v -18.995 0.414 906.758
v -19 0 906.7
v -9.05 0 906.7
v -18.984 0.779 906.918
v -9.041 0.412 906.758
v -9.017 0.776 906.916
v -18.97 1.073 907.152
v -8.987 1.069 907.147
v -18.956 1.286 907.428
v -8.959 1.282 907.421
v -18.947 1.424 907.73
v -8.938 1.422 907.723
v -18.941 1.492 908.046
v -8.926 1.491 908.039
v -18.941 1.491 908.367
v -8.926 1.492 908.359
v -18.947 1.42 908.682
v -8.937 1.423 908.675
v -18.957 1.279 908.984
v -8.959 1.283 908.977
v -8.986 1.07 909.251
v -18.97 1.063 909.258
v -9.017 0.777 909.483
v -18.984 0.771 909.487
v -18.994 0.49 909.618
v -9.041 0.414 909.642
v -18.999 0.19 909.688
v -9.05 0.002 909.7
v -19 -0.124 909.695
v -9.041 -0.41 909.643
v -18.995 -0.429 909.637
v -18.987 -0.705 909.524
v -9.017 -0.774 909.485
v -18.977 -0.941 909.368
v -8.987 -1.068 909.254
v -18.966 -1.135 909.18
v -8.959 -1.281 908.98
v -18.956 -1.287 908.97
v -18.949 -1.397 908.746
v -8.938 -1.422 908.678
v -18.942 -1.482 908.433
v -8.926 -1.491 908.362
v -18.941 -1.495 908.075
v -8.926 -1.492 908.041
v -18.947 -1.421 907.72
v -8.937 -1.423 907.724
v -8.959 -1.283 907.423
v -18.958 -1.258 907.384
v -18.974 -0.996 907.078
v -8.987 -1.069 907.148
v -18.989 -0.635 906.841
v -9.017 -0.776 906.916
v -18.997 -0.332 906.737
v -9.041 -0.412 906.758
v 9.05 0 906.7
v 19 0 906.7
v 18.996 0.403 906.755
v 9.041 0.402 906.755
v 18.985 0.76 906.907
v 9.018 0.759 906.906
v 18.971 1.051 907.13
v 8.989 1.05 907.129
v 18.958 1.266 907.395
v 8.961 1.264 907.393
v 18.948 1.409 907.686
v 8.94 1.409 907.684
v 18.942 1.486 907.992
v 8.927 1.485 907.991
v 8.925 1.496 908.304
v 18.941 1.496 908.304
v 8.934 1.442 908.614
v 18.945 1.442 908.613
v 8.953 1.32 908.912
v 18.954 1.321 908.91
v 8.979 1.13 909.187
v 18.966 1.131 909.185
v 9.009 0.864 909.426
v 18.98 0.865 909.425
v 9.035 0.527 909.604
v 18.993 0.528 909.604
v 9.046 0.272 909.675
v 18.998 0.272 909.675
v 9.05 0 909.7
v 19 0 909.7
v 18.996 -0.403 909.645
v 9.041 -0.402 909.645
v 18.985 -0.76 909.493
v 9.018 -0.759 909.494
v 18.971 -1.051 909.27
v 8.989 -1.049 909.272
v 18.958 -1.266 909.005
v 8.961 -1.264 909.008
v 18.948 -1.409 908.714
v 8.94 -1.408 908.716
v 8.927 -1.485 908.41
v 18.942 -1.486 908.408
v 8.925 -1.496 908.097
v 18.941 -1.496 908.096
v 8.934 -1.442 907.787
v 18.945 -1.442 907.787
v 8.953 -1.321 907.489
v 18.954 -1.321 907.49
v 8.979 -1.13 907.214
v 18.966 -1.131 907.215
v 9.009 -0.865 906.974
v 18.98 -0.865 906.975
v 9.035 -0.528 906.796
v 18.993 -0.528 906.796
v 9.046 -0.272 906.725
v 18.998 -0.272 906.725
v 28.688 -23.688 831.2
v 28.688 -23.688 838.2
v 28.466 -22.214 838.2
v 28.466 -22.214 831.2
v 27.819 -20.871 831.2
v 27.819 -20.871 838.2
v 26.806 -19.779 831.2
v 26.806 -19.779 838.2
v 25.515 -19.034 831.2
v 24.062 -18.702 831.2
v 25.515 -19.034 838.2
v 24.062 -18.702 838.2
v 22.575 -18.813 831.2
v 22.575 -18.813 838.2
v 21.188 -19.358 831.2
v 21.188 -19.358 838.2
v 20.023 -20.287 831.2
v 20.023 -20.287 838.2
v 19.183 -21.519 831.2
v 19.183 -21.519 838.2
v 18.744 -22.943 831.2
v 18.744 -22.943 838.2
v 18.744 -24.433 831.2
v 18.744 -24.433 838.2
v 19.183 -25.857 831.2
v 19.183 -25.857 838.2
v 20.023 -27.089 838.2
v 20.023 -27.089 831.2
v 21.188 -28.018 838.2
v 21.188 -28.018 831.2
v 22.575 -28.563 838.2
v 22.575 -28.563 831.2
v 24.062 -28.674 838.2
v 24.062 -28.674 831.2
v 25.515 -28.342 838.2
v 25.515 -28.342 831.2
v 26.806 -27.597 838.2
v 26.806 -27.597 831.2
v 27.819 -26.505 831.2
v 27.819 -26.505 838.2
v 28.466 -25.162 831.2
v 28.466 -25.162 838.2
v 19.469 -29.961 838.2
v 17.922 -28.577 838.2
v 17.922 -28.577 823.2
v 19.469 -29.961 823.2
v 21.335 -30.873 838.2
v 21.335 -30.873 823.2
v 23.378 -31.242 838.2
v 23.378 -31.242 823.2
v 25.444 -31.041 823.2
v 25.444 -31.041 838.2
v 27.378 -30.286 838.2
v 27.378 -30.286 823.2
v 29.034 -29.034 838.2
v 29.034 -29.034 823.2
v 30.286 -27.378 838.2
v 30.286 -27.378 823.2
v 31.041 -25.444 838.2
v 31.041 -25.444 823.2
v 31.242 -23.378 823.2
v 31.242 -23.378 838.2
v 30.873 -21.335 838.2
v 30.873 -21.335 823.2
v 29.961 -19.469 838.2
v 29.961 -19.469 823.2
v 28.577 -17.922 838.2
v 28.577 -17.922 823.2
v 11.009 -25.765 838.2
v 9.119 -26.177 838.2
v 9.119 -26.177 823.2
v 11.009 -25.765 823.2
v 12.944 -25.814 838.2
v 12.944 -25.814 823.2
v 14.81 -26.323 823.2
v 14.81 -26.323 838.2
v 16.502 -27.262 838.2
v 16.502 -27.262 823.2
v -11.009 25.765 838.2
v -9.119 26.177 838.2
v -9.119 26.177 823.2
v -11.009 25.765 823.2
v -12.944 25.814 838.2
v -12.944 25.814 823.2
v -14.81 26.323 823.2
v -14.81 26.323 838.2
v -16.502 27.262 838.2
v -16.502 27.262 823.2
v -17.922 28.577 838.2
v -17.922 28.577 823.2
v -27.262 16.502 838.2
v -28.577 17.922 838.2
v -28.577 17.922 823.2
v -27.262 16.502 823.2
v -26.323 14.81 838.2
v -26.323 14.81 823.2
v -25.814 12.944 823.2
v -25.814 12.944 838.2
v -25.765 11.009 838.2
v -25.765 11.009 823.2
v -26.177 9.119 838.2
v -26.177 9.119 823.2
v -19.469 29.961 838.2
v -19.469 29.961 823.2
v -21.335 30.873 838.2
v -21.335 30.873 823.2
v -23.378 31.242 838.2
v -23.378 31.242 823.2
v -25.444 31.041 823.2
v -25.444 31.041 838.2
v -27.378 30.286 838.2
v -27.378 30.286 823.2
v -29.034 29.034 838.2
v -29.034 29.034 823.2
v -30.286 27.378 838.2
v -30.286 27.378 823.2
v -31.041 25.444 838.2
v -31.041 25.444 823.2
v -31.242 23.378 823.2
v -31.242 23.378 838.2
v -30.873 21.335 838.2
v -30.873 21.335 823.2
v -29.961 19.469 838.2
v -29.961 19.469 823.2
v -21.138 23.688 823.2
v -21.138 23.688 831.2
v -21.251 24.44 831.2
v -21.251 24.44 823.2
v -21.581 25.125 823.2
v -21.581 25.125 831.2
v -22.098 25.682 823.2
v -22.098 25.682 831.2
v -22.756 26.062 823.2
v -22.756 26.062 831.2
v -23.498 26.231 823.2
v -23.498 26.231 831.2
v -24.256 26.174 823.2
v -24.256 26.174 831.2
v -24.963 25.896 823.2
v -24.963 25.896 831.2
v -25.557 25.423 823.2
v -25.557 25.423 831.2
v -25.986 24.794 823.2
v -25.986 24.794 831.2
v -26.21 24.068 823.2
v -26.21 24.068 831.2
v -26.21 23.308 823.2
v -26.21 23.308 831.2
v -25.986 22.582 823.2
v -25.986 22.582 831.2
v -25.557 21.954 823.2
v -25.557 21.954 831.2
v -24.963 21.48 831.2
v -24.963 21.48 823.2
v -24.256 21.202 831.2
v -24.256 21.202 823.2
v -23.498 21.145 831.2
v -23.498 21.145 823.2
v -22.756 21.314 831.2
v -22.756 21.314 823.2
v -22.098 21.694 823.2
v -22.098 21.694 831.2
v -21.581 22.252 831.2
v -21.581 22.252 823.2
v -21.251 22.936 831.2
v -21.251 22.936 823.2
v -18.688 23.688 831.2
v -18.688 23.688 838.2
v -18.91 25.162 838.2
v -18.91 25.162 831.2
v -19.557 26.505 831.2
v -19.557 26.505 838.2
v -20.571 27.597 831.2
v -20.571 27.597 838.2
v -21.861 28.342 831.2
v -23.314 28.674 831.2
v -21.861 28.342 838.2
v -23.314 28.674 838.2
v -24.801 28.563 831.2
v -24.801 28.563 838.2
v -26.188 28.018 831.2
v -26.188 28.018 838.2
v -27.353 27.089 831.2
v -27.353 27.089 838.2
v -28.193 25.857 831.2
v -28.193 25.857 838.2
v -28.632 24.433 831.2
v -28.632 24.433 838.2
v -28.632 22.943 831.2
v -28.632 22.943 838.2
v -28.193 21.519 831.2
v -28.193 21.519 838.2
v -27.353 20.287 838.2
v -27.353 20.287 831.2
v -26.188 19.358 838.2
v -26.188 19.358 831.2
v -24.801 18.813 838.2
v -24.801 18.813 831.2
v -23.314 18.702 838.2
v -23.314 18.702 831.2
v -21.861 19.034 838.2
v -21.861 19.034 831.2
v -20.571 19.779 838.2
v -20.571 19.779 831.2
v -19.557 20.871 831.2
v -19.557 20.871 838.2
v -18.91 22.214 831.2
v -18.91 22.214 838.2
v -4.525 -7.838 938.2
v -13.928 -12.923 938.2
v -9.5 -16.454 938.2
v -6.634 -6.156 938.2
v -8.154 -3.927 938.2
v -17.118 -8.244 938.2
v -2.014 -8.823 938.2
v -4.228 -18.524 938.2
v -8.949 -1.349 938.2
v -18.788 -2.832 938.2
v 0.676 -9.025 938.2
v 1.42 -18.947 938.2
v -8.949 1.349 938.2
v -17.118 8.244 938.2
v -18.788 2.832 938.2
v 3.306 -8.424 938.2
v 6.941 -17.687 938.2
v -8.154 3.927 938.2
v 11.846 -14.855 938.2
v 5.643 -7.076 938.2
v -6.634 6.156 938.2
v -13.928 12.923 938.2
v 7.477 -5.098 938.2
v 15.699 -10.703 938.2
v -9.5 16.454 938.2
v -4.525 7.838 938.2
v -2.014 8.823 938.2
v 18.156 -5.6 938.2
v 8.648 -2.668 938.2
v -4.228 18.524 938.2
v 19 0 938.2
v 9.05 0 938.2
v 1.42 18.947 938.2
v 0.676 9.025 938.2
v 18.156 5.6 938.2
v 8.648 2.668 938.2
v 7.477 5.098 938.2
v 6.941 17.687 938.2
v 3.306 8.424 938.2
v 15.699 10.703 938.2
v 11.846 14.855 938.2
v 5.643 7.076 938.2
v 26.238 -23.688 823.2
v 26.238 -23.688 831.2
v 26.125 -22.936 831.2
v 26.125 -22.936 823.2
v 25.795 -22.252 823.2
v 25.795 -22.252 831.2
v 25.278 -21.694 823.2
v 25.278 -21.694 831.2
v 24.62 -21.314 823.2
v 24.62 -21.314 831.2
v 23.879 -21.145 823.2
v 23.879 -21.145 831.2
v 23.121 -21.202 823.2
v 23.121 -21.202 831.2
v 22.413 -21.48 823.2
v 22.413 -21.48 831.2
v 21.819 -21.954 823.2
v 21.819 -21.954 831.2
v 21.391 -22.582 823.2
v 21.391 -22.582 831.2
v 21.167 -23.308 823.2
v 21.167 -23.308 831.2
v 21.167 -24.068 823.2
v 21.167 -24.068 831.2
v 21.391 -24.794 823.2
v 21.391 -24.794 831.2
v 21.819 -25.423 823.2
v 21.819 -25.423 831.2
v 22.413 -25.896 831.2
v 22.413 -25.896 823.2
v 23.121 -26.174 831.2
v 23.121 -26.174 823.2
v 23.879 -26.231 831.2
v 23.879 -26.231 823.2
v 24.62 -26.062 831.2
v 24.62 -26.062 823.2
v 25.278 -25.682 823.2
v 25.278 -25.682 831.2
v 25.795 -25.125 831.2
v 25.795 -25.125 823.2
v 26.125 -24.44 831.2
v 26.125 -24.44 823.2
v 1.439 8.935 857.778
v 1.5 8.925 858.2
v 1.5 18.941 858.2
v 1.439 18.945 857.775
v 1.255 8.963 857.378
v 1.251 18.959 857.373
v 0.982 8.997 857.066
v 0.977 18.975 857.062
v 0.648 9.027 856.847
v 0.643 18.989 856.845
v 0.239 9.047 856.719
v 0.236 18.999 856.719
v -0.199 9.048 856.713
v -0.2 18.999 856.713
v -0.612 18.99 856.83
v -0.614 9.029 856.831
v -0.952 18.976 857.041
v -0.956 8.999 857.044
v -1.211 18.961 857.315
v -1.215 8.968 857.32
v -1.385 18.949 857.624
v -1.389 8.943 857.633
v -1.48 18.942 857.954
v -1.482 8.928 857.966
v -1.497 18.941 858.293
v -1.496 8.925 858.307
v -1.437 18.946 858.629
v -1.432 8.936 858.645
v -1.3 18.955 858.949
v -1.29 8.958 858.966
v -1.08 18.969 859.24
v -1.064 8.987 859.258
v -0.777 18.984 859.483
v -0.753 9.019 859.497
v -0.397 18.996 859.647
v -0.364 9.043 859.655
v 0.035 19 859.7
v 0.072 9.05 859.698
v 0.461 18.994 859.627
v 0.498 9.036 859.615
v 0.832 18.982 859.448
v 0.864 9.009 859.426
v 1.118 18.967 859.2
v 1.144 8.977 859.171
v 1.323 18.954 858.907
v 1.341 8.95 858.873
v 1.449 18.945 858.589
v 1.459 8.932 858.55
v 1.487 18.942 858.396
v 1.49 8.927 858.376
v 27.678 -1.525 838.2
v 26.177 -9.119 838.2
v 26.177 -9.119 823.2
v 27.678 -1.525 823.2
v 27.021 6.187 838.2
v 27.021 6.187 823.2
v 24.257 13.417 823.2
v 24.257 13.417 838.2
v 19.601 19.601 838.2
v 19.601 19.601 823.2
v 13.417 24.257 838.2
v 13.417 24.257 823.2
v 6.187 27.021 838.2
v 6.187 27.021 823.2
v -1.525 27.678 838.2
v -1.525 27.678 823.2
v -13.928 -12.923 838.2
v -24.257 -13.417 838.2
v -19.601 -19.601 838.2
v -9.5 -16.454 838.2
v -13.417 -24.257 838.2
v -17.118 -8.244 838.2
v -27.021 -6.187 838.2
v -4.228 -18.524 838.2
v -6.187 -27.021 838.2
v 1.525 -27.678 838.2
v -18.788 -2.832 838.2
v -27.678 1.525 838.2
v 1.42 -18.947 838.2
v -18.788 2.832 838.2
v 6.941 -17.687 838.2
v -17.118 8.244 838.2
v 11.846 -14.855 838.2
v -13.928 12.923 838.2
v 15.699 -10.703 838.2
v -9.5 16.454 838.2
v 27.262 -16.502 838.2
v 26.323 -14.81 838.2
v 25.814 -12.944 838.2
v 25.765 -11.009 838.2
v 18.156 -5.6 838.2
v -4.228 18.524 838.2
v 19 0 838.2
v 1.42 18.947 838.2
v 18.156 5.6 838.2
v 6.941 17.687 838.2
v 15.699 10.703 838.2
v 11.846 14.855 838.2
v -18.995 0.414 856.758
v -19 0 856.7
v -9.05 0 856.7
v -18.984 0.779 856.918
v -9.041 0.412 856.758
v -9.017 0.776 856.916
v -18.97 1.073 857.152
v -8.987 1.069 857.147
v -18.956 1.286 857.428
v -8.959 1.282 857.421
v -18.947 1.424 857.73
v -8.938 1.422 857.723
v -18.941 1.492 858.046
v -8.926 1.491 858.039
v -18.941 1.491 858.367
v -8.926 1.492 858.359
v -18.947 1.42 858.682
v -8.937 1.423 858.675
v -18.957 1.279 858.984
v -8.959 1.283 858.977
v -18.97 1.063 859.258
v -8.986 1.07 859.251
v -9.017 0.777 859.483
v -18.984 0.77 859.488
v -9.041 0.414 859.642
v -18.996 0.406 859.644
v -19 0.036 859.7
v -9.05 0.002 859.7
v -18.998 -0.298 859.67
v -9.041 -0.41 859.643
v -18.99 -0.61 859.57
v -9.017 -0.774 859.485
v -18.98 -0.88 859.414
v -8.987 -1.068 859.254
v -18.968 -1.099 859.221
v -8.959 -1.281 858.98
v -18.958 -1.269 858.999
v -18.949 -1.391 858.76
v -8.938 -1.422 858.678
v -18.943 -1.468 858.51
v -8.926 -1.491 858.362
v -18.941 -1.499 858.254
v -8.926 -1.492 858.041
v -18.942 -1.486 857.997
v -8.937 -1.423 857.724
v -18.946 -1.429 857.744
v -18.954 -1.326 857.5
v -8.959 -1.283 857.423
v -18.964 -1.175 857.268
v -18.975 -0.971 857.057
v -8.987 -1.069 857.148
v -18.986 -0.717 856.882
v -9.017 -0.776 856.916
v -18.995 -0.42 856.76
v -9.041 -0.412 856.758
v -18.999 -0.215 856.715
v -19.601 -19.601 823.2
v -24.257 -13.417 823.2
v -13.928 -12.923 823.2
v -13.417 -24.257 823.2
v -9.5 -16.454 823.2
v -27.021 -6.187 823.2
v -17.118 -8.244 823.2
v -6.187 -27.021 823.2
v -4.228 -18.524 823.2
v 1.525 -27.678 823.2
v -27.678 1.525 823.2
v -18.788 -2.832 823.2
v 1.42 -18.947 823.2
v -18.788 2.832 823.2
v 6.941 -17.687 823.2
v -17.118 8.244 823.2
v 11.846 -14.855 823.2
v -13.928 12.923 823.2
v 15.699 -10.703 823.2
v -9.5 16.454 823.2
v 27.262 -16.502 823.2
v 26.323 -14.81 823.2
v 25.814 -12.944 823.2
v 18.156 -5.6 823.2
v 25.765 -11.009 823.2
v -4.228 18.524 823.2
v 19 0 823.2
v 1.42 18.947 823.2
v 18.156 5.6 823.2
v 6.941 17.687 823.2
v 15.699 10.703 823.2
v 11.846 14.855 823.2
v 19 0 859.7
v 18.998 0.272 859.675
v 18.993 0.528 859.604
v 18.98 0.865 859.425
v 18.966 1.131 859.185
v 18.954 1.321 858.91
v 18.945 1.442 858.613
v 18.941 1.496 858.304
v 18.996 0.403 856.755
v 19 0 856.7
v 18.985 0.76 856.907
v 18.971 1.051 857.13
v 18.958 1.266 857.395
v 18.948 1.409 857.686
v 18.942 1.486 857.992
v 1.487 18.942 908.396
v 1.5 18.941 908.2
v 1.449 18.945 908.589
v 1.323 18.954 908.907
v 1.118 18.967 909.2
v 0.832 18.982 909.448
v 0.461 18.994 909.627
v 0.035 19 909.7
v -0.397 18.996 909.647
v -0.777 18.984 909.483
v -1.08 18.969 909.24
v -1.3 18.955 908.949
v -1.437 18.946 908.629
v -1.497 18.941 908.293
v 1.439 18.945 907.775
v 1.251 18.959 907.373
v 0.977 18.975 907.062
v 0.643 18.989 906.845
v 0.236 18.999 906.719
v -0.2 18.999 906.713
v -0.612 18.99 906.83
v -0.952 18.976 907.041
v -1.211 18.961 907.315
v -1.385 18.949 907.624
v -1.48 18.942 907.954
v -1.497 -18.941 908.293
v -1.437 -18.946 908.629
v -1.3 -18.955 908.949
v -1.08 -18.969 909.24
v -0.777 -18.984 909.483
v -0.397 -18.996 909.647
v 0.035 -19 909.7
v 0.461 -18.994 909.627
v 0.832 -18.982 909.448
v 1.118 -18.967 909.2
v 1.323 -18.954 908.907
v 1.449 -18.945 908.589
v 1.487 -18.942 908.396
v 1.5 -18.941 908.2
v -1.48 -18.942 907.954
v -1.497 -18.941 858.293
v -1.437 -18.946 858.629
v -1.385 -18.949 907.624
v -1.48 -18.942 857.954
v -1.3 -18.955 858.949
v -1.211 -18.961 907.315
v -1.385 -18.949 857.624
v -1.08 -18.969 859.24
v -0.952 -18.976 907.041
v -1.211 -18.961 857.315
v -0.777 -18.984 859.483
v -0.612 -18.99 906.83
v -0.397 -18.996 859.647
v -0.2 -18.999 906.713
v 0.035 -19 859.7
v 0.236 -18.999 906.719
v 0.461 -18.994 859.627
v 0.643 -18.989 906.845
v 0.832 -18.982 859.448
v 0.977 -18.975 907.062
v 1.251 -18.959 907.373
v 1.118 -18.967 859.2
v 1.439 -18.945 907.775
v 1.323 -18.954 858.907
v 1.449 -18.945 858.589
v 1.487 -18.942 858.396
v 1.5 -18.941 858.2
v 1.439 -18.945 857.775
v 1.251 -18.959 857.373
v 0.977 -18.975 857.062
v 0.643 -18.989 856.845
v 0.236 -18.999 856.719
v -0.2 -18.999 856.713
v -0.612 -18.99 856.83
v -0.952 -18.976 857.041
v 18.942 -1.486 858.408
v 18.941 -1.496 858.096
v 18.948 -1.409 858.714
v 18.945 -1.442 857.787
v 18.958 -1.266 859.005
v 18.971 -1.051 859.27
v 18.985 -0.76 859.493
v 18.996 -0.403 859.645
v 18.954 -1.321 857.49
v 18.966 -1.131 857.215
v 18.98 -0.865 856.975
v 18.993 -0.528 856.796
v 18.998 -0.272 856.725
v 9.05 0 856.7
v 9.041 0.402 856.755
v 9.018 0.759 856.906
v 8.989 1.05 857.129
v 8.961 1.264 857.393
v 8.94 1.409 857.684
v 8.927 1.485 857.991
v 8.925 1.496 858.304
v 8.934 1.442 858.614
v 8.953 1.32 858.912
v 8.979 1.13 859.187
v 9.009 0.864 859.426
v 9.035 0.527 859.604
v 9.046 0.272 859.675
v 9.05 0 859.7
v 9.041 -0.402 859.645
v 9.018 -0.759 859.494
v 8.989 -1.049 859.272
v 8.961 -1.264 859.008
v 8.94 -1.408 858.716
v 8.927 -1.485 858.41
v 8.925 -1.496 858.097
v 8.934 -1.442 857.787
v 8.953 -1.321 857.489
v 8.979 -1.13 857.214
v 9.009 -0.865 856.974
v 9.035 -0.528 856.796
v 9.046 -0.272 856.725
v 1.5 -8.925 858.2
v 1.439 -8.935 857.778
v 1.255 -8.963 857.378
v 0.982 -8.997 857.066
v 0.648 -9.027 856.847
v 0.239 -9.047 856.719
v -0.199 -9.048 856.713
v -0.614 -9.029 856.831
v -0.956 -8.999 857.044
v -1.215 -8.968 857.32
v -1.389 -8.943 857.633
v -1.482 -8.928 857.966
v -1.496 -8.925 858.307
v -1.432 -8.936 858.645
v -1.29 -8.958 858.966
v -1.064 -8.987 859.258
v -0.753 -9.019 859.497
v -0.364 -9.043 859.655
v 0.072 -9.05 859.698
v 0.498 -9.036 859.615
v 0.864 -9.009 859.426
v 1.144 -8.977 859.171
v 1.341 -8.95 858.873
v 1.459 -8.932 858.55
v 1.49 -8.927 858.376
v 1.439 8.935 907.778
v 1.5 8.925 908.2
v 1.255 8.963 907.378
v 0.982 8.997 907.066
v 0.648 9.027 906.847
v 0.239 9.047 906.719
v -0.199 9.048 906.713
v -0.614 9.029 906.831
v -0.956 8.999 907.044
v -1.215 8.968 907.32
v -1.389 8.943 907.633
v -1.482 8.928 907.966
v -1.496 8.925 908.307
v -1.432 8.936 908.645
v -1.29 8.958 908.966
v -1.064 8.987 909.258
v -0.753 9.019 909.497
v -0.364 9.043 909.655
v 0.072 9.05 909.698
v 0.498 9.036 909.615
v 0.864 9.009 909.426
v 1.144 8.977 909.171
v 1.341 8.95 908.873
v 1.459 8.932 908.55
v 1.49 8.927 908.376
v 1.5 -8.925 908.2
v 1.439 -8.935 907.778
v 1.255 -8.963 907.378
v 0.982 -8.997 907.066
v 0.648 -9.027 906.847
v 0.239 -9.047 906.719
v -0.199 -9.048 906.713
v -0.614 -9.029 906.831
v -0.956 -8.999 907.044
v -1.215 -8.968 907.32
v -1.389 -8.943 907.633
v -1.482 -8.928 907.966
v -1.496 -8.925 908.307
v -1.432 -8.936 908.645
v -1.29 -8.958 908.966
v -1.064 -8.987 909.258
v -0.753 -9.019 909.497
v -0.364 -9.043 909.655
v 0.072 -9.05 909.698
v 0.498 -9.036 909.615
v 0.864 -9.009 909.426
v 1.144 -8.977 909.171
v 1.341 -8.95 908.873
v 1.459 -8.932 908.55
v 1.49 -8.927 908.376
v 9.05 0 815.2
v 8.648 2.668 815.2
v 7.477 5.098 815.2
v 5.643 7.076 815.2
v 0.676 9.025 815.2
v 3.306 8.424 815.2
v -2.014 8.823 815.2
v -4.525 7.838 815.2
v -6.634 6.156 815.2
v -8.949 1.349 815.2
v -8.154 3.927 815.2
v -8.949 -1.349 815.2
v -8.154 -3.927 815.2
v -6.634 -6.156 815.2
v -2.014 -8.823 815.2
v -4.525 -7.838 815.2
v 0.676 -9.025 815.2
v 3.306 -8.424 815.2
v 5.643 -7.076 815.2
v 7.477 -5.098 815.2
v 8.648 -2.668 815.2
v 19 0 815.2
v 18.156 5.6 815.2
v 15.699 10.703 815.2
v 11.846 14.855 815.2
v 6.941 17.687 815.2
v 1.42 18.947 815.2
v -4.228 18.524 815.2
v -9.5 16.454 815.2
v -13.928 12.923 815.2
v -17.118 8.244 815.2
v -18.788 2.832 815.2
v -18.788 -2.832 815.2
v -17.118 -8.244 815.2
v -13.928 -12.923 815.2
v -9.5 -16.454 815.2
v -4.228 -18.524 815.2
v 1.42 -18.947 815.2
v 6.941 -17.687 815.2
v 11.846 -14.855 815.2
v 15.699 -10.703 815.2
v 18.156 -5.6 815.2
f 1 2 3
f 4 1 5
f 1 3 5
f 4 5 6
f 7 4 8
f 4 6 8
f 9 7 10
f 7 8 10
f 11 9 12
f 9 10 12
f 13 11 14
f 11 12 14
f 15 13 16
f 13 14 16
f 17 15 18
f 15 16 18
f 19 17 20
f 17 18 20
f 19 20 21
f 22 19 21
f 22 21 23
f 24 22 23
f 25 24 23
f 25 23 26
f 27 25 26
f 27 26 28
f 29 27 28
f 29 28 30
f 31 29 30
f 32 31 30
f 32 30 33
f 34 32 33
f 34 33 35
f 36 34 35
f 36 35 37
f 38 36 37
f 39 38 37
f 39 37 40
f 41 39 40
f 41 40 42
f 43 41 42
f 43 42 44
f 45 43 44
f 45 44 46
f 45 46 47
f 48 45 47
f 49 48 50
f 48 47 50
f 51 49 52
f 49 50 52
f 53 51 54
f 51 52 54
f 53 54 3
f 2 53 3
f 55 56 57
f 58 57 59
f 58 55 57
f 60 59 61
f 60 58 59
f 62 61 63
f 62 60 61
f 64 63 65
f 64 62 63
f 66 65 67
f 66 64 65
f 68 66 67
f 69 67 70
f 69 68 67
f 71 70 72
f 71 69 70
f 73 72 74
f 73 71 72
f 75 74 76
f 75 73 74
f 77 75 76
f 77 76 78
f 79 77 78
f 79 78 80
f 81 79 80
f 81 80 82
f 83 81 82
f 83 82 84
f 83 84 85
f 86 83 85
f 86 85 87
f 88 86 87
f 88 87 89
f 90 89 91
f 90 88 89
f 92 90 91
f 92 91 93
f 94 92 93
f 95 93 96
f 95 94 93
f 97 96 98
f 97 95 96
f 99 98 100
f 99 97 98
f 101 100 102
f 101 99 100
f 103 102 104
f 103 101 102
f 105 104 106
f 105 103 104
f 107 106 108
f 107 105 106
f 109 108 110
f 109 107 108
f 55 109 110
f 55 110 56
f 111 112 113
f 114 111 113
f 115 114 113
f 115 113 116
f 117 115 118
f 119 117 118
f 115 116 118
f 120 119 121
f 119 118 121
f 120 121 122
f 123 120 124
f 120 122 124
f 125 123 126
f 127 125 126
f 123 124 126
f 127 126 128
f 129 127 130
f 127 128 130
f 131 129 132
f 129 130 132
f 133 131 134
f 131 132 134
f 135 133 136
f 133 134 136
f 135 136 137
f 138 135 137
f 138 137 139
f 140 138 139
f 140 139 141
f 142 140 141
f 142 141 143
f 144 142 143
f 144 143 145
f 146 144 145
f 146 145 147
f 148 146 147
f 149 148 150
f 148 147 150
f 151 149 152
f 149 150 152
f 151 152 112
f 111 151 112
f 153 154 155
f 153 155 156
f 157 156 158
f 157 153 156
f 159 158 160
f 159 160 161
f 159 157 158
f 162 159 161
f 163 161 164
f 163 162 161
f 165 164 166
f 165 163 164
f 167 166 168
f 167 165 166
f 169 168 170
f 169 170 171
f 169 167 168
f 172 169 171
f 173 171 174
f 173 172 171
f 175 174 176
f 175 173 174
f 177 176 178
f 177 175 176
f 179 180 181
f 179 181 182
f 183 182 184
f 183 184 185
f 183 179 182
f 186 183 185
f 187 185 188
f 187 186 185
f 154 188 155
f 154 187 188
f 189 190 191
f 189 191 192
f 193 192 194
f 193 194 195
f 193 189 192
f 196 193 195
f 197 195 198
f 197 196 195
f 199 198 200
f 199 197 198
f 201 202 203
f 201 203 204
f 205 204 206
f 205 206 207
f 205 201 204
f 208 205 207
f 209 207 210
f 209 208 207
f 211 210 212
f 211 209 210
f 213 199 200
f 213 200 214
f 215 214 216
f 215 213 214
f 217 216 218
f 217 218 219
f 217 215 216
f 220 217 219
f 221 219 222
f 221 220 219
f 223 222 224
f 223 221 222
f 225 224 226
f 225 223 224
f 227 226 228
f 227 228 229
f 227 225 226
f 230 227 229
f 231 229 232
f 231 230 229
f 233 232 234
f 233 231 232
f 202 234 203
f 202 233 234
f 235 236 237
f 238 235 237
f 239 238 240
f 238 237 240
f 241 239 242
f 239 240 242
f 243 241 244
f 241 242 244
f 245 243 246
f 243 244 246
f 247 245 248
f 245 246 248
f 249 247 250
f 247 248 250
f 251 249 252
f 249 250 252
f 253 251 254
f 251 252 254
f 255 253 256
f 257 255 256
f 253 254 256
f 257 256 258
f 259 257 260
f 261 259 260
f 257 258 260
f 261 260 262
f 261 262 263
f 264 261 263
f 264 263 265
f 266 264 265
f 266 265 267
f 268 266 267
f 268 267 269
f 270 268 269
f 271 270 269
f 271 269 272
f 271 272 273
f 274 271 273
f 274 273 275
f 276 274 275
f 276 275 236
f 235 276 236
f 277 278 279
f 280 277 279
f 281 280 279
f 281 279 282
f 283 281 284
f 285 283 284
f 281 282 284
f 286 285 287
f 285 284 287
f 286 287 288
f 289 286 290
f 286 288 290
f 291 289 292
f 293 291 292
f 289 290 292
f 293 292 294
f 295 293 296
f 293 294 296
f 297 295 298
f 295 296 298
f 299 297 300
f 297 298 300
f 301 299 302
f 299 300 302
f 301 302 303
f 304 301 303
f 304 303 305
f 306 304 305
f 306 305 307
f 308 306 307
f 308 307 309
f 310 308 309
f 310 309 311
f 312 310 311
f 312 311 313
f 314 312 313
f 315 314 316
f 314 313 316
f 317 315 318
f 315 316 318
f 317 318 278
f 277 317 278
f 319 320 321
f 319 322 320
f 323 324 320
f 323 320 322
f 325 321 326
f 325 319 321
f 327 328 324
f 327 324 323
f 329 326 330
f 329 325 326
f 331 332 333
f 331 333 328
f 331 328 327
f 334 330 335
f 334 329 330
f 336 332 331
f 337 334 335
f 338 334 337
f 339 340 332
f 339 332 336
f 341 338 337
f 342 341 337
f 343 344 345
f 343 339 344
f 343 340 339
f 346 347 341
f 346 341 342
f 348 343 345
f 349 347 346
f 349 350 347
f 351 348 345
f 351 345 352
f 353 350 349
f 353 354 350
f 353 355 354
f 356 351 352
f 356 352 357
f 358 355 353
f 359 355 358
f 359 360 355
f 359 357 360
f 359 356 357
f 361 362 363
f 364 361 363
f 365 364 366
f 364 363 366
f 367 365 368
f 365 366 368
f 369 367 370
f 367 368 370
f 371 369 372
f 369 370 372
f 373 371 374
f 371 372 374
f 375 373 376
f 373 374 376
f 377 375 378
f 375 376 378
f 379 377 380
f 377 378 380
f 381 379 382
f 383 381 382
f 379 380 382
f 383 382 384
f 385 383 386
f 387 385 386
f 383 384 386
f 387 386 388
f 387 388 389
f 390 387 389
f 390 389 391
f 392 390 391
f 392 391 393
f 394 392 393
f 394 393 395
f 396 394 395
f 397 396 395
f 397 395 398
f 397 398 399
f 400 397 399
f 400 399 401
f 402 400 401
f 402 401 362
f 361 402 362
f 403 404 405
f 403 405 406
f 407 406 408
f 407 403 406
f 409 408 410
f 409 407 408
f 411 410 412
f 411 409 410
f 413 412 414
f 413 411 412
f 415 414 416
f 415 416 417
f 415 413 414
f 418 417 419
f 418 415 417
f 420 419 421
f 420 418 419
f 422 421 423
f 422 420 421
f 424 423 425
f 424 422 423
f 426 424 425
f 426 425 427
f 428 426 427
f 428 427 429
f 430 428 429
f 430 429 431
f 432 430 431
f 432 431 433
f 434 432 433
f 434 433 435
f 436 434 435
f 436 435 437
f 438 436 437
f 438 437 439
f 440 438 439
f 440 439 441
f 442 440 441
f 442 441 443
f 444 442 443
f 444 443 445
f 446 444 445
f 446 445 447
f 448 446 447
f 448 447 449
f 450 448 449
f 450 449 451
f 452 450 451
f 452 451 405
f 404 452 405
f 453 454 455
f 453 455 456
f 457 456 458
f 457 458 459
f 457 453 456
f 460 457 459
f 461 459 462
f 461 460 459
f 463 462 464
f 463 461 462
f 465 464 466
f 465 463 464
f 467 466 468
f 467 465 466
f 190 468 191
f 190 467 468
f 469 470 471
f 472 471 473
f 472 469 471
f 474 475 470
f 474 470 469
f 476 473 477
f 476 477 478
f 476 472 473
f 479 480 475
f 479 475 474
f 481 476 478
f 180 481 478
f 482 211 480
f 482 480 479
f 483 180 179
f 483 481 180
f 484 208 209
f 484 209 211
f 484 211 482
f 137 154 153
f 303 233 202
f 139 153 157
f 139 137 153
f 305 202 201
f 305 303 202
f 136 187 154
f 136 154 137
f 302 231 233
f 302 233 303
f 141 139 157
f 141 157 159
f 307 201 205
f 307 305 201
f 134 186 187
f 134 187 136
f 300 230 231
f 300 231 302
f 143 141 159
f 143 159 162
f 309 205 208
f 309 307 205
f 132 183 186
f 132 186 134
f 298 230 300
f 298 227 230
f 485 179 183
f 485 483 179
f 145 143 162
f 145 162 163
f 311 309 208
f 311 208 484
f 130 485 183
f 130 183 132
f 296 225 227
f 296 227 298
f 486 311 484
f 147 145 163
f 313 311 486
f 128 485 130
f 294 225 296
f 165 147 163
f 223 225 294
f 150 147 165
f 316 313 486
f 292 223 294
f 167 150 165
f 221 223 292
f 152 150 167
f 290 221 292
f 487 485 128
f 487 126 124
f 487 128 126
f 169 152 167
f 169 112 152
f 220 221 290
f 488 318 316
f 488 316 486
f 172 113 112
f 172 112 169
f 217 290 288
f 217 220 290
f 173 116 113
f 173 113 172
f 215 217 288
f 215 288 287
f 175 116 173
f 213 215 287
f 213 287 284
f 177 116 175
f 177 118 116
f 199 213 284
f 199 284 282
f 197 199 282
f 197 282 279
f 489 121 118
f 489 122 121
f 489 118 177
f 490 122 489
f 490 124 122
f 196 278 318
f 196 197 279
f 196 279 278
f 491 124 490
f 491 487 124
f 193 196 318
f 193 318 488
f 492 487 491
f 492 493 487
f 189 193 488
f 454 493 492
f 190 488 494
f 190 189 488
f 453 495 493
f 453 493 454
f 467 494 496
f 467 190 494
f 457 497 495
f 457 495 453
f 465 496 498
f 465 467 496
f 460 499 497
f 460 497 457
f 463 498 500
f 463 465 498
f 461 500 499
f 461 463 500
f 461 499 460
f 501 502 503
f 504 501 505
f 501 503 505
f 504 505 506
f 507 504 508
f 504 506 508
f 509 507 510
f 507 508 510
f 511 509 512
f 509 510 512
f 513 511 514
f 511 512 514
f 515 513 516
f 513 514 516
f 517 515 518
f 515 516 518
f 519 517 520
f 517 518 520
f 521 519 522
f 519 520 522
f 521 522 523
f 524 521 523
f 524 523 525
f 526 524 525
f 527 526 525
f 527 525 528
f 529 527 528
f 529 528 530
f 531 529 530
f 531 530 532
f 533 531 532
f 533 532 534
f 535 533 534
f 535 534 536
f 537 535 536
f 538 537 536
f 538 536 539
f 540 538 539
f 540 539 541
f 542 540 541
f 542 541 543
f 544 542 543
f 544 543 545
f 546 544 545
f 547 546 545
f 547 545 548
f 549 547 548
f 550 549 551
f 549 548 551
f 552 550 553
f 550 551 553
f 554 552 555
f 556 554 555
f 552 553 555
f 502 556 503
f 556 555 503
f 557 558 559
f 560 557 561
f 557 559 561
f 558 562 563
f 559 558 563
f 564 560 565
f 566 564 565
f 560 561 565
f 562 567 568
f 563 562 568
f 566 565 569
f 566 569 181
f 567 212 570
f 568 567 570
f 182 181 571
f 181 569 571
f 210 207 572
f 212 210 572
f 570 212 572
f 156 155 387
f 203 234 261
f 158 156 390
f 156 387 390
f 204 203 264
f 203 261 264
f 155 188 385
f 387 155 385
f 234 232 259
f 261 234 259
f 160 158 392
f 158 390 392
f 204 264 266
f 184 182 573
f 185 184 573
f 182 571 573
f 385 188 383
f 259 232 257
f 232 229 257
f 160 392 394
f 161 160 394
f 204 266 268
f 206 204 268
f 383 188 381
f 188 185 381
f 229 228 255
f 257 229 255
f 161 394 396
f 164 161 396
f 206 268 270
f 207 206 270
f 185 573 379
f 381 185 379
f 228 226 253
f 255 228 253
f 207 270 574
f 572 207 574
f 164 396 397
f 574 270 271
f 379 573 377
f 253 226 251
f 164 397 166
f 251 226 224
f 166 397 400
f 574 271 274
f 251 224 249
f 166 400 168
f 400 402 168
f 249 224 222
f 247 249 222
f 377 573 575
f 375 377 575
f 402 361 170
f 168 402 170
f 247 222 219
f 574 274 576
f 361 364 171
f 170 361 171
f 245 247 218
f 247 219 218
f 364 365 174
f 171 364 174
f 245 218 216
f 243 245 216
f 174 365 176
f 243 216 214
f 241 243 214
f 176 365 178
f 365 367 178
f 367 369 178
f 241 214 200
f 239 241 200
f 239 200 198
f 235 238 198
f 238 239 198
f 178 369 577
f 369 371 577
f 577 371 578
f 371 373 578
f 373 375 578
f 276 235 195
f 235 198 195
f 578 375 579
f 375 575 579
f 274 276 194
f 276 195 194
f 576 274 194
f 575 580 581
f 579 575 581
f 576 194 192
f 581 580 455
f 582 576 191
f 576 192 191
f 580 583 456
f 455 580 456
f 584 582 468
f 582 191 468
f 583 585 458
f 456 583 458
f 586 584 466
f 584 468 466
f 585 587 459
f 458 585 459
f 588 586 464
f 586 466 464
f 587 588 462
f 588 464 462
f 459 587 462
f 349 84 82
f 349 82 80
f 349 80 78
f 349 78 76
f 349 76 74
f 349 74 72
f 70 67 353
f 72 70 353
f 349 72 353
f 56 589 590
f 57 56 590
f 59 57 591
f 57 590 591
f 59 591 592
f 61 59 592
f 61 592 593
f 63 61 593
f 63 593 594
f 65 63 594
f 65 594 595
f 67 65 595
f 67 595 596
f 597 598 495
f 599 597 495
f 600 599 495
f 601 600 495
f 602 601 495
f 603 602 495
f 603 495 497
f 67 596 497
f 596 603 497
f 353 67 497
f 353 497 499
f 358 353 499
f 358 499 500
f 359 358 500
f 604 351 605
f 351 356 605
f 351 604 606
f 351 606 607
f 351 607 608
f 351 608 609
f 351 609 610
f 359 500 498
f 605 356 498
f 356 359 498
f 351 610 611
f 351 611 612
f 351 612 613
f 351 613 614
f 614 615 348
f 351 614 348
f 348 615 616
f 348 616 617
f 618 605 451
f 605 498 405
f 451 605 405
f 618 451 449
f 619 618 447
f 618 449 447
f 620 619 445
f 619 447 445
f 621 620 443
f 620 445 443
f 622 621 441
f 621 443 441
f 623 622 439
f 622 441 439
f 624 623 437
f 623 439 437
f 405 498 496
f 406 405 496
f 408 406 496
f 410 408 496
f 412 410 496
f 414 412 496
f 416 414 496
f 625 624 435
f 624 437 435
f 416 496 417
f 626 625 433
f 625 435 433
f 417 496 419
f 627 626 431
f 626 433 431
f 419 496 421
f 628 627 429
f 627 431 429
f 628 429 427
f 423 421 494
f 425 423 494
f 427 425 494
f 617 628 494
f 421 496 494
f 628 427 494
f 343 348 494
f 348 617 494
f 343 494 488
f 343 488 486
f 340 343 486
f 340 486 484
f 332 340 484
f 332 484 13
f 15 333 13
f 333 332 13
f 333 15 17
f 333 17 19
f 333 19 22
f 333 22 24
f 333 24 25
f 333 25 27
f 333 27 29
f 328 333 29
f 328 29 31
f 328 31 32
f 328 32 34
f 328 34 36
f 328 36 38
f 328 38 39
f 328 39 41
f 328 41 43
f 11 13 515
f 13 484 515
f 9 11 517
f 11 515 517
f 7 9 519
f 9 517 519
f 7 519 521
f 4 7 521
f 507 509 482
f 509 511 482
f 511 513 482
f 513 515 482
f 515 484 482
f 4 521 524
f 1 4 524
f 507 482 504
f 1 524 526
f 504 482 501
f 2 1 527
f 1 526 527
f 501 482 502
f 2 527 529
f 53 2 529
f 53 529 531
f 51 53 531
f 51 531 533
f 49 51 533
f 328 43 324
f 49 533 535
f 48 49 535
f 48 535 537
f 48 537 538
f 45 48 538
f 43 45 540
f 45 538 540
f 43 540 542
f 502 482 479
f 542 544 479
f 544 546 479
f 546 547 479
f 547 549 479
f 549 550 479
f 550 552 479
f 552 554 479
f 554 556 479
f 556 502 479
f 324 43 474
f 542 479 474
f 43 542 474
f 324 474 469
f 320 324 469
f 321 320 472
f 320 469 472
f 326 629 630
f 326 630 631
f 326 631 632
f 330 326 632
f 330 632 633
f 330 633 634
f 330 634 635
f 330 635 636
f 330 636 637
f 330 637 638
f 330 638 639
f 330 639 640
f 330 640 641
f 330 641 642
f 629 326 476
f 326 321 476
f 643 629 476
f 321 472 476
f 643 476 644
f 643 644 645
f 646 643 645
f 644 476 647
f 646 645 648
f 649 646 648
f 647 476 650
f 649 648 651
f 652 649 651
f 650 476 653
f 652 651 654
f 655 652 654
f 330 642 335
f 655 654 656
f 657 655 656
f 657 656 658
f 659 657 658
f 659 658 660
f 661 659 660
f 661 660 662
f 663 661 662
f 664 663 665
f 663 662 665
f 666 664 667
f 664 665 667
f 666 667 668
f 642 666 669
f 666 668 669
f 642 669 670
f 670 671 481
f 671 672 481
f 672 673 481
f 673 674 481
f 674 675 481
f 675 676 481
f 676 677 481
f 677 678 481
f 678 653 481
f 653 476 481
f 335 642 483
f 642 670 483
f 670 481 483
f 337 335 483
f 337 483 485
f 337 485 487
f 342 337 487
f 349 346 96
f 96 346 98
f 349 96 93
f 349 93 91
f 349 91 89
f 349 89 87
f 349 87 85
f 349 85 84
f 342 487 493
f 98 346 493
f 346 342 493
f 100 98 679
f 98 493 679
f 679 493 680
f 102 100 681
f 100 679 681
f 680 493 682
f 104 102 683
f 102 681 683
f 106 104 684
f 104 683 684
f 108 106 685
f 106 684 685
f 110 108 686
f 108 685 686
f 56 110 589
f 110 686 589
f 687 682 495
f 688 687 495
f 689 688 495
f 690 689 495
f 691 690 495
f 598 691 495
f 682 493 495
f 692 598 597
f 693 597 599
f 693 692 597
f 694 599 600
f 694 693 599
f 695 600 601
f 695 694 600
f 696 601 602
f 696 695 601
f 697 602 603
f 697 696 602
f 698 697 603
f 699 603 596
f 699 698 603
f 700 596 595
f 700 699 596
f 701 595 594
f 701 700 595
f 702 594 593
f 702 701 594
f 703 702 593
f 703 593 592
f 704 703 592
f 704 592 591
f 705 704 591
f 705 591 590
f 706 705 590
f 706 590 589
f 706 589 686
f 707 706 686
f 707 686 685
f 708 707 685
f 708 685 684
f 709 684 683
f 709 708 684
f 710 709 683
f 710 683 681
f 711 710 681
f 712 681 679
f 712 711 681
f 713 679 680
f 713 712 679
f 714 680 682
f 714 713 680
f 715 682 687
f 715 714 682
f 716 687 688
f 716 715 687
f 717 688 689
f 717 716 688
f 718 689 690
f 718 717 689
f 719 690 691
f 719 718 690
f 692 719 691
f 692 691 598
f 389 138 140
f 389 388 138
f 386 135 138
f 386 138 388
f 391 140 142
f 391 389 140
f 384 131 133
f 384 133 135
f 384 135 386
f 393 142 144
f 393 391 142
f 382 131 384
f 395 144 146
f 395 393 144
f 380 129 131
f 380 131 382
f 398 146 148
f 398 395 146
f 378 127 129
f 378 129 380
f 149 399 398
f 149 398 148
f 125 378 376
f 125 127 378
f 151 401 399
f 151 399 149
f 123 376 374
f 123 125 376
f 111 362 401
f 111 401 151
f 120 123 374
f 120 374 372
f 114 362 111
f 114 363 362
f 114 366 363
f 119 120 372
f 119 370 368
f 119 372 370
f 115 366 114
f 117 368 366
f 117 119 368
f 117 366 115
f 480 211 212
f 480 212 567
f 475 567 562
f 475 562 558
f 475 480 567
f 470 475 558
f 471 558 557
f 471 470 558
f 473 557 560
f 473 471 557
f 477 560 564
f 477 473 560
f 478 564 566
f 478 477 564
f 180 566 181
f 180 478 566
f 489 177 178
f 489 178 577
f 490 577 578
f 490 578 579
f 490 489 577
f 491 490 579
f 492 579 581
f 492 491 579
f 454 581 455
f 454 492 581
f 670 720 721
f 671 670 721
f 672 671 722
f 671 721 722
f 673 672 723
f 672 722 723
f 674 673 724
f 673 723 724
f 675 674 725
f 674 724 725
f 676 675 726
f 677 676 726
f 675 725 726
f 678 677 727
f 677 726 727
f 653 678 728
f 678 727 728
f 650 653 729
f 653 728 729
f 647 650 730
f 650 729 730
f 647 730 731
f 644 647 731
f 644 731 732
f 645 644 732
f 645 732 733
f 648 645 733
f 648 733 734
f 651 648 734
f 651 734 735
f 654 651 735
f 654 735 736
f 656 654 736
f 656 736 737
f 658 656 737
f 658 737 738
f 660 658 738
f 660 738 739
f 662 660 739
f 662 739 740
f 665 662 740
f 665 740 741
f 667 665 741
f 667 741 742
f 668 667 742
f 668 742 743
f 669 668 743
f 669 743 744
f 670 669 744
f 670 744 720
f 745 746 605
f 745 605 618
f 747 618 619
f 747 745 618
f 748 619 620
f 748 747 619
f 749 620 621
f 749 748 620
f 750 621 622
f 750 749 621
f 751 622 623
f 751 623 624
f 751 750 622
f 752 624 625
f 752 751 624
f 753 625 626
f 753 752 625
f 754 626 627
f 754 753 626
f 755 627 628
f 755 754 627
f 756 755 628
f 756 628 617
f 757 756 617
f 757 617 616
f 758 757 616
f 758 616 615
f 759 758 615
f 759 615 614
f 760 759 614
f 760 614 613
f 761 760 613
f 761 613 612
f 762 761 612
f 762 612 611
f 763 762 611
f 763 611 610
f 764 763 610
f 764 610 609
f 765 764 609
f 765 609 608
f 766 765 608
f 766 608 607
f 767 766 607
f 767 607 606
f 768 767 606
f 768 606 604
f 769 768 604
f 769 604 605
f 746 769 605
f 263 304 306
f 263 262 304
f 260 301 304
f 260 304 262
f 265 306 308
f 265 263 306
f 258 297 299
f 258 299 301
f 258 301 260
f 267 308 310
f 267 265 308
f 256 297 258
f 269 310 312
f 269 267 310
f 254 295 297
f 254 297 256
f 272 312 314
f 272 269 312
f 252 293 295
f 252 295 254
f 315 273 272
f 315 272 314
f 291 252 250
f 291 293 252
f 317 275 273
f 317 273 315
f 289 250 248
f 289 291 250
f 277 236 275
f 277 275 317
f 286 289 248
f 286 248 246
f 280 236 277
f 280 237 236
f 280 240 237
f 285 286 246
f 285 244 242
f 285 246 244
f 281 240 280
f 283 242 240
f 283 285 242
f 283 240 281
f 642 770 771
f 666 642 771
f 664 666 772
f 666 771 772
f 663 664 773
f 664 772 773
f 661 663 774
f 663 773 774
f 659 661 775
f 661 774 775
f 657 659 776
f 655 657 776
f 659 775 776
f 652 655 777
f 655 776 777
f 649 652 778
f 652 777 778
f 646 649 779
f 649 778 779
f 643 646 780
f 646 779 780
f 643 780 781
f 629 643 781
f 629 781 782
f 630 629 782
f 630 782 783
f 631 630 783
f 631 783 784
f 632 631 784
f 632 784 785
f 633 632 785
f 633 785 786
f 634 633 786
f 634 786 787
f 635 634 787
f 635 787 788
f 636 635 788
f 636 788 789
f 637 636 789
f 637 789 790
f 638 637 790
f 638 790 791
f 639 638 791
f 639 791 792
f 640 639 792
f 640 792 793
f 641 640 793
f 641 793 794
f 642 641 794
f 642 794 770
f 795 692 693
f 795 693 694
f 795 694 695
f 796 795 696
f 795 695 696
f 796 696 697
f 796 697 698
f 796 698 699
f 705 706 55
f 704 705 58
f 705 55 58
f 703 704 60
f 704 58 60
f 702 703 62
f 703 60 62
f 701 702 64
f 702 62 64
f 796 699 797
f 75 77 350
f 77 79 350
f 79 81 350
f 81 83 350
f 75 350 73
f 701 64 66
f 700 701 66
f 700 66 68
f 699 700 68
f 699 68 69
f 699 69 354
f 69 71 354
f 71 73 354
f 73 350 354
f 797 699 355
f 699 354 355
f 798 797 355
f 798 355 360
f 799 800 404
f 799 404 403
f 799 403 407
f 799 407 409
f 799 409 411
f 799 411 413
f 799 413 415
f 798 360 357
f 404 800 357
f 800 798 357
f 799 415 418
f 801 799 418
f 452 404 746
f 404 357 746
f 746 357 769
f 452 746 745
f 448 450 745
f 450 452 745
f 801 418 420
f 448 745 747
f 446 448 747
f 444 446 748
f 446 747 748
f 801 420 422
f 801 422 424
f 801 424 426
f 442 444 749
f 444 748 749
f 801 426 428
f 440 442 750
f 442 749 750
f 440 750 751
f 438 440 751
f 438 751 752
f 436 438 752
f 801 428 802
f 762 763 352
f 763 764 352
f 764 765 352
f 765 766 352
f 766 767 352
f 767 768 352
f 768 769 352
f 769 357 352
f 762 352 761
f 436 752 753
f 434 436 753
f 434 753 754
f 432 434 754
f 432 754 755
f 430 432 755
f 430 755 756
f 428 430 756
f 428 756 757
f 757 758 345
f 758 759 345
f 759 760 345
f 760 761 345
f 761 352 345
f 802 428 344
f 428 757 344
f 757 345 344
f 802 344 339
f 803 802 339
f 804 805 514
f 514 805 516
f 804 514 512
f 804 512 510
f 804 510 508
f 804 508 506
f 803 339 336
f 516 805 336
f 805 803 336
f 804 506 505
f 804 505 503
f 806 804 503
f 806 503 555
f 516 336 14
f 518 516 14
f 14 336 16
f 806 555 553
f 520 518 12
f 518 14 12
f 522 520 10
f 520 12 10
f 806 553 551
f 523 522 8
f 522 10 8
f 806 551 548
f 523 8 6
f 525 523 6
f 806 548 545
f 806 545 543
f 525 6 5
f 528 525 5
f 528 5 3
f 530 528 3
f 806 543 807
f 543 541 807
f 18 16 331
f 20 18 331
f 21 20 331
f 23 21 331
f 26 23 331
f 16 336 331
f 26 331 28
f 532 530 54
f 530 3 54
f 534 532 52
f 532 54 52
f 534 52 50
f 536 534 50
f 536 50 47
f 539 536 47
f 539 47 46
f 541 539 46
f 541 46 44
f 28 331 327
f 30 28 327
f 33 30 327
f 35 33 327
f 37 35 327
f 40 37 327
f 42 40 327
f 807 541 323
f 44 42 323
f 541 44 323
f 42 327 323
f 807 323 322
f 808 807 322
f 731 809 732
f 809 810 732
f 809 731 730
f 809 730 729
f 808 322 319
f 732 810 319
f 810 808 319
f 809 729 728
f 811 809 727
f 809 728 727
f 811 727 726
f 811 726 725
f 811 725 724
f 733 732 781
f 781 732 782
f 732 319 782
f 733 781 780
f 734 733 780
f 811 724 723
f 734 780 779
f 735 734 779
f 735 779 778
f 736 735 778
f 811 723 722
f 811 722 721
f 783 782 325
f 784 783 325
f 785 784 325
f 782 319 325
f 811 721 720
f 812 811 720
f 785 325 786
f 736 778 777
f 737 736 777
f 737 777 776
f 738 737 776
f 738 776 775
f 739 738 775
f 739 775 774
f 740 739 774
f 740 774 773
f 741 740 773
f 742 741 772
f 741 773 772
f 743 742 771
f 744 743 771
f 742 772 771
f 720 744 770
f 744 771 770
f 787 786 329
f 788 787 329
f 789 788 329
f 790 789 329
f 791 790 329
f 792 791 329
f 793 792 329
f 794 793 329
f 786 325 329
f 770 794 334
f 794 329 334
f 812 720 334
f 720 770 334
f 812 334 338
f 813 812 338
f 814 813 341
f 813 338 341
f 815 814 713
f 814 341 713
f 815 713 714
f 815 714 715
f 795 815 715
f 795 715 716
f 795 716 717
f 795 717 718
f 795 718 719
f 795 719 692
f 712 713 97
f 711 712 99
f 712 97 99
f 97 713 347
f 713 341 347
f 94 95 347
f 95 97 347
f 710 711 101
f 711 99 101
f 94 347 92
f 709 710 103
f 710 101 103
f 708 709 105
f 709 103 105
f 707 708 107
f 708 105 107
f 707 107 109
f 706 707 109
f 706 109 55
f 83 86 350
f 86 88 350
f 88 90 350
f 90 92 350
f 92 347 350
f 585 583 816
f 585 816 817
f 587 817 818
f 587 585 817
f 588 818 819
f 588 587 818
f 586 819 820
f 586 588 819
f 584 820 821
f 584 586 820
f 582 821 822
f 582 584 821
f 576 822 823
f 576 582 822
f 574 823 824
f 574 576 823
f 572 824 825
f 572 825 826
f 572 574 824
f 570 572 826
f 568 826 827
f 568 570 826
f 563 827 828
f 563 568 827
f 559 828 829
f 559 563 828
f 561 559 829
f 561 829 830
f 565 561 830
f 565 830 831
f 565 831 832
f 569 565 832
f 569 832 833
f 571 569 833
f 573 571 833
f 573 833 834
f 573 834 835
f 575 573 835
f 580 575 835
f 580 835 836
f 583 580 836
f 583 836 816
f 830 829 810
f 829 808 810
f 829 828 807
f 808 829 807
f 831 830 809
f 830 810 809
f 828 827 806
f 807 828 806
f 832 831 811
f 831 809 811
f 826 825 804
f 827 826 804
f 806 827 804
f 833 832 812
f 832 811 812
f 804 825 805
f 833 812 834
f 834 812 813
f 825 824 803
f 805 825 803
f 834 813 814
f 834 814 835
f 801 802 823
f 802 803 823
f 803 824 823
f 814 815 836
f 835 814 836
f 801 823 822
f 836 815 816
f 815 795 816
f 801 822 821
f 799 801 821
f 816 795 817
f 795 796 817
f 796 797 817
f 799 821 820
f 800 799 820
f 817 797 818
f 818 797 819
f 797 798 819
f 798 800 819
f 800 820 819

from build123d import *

# Parameters (mm, degrees)
ESQUISSE1_R                  = 2.55
BOSS_EXTRU_1_DEPTH           = 15
ESQUISSE9_R                  = 19
BOSS_EXTRU_4_DEPTH           = 100
BOSS_EXTRU_4_DEPTH_BACK      = 23
ESQUISSE12_R                 = 9.05
ENL_V_MAT_EXTRU_2_DEPTH      = 124
ESQUISSE13_R                 = 5
ENL_V_MAT_EXTRU_3_DEPTH      = 7
ESQUISSE14_R                 = 1.5
ENL_V_MAT_EXTRU_4_DEPTH      = 32.248101798
ENL_V_MAT_EXTRU_4_DEPTH_BACK = 32.248101798
ESQUISSE15_R                 = 1.5
ENL_V_MAT_EXTRU_5_DEPTH      = 32.248101798
ENL_V_MAT_EXTRU_5_DEPTH_BACK = 32.248101798


with BuildPart() as part:
    # Esquisse1 → Boss.-Extru.1 (new body)
    with BuildSketch(Plane.XY.offset(838.2)):
        with BuildLine():
            ThreePointArc((-9.11861011, 26.177363431), (-13.892343586, 26.012514183), (-17.921893066, 28.577360682))
            ThreePointArc((-17.921893066, 28.577360682), (-29.033821851, 29.033821851), (-28.577360682, 17.921893066))
            ThreePointArc((-28.577360682, 17.921893066), (-26.012514183, 13.892343586), (-26.177363431, 9.11861011))
            ThreePointArc((-26.177363431, 9.11861011), (-19.60106383, -19.60106383), (9.11861011, -26.177363431))
            ThreePointArc((9.11861011, -26.177363431), (13.892343586, -26.012514183), (17.921893066, -28.577360682))
            ThreePointArc((17.921893066, -28.577360682), (29.033821851, -29.033821851), (28.577360682, -17.921893066))
            ThreePointArc((28.577360682, -17.921893066), (26.012514183, -13.892343586), (26.177363431, -9.11861011))
            ThreePointArc((26.177363431, -9.11861011), (19.60106383, 19.60106383), (-9.11861011, 26.177363431))
        make_face()
        with Locations((23.68807717, -23.68807717)):
            Circle(ESQUISSE1_R, mode=Mode.SUBTRACT)
        with Locations((-23.68807717, 23.68807717)):
            Circle(ESQUISSE1_R, mode=Mode.SUBTRACT)
    extrude(amount=-BOSS_EXTRU_1_DEPTH)

    # Esquisse9 → Boss.-Extru.4 (add, two sides)
    with BuildSketch(Plane.XY.offset(838.2)) as boss_extru_4_sk:
        Circle(ESQUISSE9_R)
    extrude(amount=BOSS_EXTRU_4_DEPTH)
    extrude(boss_extru_4_sk.sketch, amount=-BOSS_EXTRU_4_DEPTH_BACK)

    # Esquisse12 → Enlèv. mat.-Extru.2 (cut, through all)
    with BuildSketch(Plane.XY.offset(938.2)):
        Circle(ESQUISSE12_R)
    extrude(amount=-ENL_V_MAT_EXTRU_2_DEPTH, mode=Mode.SUBTRACT)

    # Esquisse13 → Enlèv. mat.-Extru.3 (cut)
    with BuildSketch(Plane.XY.offset(838.2)):
        with Locations((-23.68807717, 23.68807717)):
            Circle(ESQUISSE13_R)
        with Locations((23.68807717, -23.68807717)):
            Circle(ESQUISSE13_R)
    extrude(amount=-ENL_V_MAT_EXTRU_3_DEPTH, mode=Mode.SUBTRACT)

    # Esquisse14 → Enlèv. mat.-Extru.4 (cut, two sides)
    with BuildSketch(Plane(origin=(0, 0, 0), x_dir=(1, 0, 0), z_dir=(0, 1, 0))) as enl_v_mat_extru_4_sk:
        with Locations((0, -858.2)):
            Circle(ESQUISSE14_R)
        with Locations((0, -908.2)):
            Circle(ESQUISSE14_R)
    extrude(amount=ENL_V_MAT_EXTRU_4_DEPTH, mode=Mode.SUBTRACT)
    extrude(enl_v_mat_extru_4_sk.sketch, amount=-ENL_V_MAT_EXTRU_4_DEPTH_BACK, mode=Mode.SUBTRACT)

    # Esquisse15 → Enlèv. mat.-Extru.5 (cut, two sides)
    with BuildSketch(Plane(origin=(0, 0, 0), x_dir=(0, 0, -1), z_dir=(1, 0, 0))) as enl_v_mat_extru_5_sk:
        with Locations((-858.2, 0)):
            Circle(ESQUISSE15_R)
        with Locations((-908.2, 0)):
            Circle(ESQUISSE15_R)
    extrude(amount=ENL_V_MAT_EXTRU_5_DEPTH, mode=Mode.SUBTRACT)
    extrude(enl_v_mat_extru_5_sk.sketch, amount=-ENL_V_MAT_EXTRU_5_DEPTH_BACK, mode=Mode.SUBTRACT)


solid = part.part
